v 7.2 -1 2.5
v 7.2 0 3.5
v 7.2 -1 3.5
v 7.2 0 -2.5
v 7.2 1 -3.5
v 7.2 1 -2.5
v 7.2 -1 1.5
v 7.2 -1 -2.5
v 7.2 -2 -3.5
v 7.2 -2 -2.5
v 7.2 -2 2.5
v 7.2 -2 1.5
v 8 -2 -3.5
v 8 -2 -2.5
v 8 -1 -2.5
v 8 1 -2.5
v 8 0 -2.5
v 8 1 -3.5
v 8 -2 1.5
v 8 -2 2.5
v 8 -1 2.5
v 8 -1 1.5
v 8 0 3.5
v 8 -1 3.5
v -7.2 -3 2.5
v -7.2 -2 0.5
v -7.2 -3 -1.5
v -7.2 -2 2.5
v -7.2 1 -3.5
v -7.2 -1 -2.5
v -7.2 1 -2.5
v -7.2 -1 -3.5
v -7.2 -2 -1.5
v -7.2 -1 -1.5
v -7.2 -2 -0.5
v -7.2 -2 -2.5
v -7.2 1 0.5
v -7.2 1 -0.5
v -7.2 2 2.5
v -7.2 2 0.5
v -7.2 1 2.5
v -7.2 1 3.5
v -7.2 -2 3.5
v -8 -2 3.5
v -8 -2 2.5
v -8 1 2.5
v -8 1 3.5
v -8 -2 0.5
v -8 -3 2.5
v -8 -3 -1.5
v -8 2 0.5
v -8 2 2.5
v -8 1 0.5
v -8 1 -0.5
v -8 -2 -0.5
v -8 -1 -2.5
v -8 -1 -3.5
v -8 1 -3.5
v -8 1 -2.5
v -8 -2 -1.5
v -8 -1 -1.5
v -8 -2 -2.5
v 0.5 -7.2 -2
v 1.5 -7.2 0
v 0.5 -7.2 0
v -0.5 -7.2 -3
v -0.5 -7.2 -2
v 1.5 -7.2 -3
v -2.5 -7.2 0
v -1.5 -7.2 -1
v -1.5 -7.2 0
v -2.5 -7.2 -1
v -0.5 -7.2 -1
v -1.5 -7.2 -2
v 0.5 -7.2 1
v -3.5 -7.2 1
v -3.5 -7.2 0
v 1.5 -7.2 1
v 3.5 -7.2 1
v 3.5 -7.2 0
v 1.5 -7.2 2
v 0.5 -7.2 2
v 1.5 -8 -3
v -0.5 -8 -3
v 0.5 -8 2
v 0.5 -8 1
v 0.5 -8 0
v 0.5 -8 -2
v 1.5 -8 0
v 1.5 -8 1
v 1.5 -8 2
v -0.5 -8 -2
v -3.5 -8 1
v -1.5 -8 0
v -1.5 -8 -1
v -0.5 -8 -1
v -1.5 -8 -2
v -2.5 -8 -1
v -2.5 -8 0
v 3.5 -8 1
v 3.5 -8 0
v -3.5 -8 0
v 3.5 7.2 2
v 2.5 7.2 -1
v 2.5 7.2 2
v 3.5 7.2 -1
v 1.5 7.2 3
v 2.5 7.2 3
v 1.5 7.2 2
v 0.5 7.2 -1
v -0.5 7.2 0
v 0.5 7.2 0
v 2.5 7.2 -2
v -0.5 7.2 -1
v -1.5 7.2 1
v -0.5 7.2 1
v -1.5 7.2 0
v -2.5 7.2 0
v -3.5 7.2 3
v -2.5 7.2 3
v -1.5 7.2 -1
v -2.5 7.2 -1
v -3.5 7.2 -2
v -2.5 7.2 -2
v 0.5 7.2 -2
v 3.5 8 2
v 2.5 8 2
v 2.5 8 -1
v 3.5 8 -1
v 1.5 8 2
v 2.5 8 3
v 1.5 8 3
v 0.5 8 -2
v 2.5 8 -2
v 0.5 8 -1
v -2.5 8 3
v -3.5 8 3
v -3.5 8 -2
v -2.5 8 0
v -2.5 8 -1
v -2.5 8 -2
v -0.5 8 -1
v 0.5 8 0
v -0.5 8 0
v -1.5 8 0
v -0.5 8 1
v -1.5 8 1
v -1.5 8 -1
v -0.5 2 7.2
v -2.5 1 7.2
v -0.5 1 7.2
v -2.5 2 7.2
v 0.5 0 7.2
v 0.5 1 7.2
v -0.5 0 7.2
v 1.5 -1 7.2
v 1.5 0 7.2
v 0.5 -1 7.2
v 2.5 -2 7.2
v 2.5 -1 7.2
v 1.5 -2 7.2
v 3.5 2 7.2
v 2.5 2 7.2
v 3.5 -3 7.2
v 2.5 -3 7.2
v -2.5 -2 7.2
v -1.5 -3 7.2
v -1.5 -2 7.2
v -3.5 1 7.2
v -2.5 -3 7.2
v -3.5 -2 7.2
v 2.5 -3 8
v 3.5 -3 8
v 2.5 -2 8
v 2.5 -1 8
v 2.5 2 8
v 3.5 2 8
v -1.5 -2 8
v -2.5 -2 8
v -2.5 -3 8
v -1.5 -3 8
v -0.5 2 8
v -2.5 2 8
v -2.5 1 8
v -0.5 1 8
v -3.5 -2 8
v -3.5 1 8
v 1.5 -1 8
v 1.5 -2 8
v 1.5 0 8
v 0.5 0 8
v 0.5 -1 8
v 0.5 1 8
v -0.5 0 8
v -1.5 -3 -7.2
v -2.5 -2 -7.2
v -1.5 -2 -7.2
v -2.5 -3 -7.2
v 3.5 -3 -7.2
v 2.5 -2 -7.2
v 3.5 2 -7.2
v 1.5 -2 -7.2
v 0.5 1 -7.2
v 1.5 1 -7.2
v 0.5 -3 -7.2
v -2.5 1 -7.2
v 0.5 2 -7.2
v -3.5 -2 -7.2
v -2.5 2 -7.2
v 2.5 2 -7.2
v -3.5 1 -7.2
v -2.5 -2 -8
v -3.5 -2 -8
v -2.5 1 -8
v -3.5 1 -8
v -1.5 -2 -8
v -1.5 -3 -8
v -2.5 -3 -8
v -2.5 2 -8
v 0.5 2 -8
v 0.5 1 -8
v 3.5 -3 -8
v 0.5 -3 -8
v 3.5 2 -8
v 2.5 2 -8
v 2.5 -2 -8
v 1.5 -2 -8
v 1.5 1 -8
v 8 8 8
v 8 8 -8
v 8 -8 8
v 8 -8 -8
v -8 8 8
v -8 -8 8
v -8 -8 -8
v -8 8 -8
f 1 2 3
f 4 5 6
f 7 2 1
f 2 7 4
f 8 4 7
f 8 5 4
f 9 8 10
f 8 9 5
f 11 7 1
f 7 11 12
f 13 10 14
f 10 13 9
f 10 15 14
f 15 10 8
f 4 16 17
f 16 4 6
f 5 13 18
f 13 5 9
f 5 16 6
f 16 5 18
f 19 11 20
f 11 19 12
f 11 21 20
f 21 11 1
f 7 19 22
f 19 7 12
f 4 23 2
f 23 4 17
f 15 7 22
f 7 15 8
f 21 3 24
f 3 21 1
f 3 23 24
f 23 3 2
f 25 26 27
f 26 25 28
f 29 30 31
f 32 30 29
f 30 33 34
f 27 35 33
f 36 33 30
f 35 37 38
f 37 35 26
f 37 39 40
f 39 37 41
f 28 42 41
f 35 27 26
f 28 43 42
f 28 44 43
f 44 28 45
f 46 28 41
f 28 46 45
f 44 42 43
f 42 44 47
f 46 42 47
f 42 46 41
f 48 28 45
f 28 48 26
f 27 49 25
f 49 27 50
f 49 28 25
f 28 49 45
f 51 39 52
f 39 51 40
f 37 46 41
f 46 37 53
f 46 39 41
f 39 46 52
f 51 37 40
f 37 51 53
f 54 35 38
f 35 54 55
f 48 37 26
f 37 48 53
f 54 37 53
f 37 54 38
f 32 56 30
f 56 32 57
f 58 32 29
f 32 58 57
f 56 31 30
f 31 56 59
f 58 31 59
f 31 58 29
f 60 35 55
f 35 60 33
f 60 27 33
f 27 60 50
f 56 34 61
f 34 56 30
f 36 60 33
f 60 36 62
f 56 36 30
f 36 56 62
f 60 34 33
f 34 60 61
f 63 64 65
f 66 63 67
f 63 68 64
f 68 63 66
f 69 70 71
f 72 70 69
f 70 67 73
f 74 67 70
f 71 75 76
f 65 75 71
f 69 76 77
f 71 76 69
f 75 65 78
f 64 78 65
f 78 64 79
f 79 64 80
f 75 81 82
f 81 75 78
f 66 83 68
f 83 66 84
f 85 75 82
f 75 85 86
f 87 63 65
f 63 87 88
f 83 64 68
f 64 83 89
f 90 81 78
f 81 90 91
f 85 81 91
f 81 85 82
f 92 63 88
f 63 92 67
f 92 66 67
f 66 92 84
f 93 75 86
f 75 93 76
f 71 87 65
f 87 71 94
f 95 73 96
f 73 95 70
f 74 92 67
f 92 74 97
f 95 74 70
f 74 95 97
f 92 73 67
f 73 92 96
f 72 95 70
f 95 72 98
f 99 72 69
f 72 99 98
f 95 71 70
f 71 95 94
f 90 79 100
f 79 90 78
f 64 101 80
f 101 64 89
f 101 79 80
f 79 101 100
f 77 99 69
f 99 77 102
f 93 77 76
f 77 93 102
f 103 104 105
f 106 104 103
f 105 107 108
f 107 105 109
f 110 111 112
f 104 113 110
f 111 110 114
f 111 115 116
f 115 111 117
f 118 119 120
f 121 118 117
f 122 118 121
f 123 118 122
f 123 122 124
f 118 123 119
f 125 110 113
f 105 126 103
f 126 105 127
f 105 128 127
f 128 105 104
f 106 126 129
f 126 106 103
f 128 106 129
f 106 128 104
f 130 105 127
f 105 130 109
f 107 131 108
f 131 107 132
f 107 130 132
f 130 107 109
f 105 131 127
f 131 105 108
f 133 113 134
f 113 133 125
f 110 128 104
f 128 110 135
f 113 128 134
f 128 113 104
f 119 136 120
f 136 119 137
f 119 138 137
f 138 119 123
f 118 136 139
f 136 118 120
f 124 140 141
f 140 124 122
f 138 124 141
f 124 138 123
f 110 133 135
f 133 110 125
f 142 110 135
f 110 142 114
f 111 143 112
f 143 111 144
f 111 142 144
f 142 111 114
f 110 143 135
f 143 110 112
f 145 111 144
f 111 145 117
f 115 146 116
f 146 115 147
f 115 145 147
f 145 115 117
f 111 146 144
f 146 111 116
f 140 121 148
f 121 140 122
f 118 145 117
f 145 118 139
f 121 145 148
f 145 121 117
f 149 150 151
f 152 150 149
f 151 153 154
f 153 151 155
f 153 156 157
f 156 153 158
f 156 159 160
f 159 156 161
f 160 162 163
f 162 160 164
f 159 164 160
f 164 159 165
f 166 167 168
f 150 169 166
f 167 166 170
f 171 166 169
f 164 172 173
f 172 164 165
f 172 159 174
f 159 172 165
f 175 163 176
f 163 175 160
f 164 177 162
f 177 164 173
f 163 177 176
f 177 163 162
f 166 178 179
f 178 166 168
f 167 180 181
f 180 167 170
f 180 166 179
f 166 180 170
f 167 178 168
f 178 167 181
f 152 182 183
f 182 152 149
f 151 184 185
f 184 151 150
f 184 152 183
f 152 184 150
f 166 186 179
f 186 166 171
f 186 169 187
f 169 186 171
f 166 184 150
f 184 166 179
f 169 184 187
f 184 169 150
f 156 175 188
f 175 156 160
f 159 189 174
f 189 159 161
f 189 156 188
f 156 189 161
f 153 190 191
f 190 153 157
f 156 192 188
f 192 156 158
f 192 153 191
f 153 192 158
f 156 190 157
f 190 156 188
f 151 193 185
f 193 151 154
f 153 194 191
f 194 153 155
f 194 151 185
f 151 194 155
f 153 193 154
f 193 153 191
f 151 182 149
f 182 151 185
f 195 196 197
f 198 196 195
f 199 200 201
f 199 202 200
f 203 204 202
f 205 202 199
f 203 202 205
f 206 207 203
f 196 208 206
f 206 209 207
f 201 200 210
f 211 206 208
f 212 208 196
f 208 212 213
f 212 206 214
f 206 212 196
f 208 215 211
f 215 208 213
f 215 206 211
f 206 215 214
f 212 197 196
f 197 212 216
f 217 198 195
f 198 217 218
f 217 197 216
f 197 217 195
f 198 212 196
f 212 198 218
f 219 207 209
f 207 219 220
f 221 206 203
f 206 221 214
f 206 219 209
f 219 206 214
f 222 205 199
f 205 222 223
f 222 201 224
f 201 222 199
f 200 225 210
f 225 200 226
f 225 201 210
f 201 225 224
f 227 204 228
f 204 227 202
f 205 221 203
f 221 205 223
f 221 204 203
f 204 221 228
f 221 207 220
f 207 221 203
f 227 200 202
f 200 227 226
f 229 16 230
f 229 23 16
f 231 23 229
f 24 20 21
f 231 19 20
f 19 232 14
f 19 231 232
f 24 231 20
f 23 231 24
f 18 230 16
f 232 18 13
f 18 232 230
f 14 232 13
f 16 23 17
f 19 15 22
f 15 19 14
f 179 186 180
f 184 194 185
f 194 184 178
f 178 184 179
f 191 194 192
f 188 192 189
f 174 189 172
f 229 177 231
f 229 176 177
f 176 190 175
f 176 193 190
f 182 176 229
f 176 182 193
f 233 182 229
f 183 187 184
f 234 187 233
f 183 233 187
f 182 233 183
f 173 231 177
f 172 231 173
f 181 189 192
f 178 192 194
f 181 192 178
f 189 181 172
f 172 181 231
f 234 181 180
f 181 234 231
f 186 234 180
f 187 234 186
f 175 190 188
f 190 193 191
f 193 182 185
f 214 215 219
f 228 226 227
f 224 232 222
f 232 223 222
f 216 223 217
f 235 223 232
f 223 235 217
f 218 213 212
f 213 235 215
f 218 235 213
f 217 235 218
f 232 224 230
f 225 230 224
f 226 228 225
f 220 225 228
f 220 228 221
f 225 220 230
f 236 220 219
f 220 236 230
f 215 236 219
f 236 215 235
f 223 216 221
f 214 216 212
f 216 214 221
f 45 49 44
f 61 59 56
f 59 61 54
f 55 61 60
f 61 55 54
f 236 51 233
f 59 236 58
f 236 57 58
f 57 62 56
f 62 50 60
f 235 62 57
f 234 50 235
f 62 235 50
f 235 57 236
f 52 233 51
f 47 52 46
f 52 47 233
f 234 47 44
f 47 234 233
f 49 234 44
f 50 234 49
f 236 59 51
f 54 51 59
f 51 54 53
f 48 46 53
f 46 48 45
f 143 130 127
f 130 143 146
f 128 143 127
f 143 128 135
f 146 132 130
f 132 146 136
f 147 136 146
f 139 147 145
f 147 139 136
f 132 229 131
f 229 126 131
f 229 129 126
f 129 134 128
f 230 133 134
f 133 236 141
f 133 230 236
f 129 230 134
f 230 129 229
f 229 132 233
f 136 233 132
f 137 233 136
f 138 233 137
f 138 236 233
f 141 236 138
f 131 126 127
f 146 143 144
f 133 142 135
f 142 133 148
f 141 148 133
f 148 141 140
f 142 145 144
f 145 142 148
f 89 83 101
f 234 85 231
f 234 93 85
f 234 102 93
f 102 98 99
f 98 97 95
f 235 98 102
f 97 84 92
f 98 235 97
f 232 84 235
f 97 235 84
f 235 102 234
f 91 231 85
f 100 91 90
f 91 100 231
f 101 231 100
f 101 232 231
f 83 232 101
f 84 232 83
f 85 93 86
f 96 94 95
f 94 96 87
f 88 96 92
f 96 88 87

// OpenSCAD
// file: TextGenerator.scad
//Draw text
scale([4,4,4]) drawtext("Hello World!");

//Draw character set
//scale([2,2,2]) drawtext(" !\"#$%&'()*+,-./0123456789:;<=>?@ABCDEFGHIJKLMNOPQRSTUVWXYZ[\\]^_`abcdefghijklmnopqrstuvwxyz{|}");

module drawtext(text,center=false) {
	//Characters
	chars = " !\"#$%&'()*+,-./0123456789:;<=>?@ABCDEFGHIJKLMNOPQRSTUVWXYZ[\\]^_`abcdefghijklmnopqrstuvwxyz{|}";

	//Chracter table defining 5x7 characters
	//Adapted from: http://www.geocities.com/dinceraydin/djlcdsim/chartable.js
	char_table = [ [ 0, 0, 0, 0, 0, 0, 0],
                  [ 4, 0, 4, 4, 4, 4, 4],
                  [ 0, 0, 0, 0,10,10,10],
                  [10,10,31,10,31,10,10],
                  [ 4,30, 5,14,20,15, 4],
                  [ 3,19, 8, 4, 2,25,24],
                  [13,18,21, 8,20,18,12],
                  [ 0, 0, 0, 0, 8, 4,12],
                  [ 2, 4, 8, 8, 8, 4, 2],
                  [ 8, 4, 2, 2, 2, 4, 8],
                  [ 0, 4,21,14,21, 4, 0],
                  [ 0, 4, 4,31, 4, 4, 0],
                  [ 8, 4,12, 0, 0, 0, 0],
                  [ 0, 0, 0,31, 0, 0, 0],
                  [12,12, 0, 0, 0, 0, 0],
                  [ 0,16, 8, 4, 2, 1, 0],
                  [14,17,25,21,19,17,14],
                  [14, 4, 4, 4, 4,12, 4],
                  [31, 8, 4, 2, 1,17,14],
                  [14,17, 1, 2, 4, 2,31],
                  [ 2, 2,31,18,10, 6, 2],
                  [14,17, 1, 1,30,16,31],
                  [14,17,17,30,16, 8, 6],
                  [ 8, 8, 8, 4, 2, 1,31],
                  [14,17,17,14,17,17,14],
                  [12, 2, 1,15,17,17,14],
                  [ 0,12,12, 0,12,12, 0],
                  [ 8, 4,12, 0,12,12, 0],
                  [ 2, 4, 8,16, 8, 4, 2],
                  [ 0, 0,31, 0,31, 0, 0],
                  [16, 8, 4, 2, 4, 8,16],
                  [ 4, 0, 4, 2, 1,17,14],
                  [14,21,21,13, 1,17,14],
                  [17,17,31,17,17,17,14],
                  [30,17,17,30,17,17,30],
                  [14,17,16,16,16,17,14],
                  [30,17,17,17,17,17,30],
                  [31,16,16,30,16,16,31],
                  [16,16,16,30,16,16,31],
                  [15,17,17,23,16,17,14],
                  [17,17,17,31,17,17,17],
                  [14, 4, 4, 4, 4, 4,14],
                  [12,18, 2, 2, 2, 2, 7],
                  [17,18,20,24,20,18,17],
                  [31,16,16,16,16,16,16],
                  [17,17,17,21,21,27,17],
                  [17,17,19,21,25,17,17],
                  [14,17,17,17,17,17,14],
                  [16,16,16,30,17,17,30],
                  [13,18,21,17,17,17,14],
                  [17,18,20,30,17,17,30],
                  [30, 1, 1,14,16,16,15],
                  [ 4, 4, 4, 4, 4, 4,31],
                  [14,17,17,17,17,17,17],
                  [ 4,10,17,17,17,17,17],
                  [10,21,21,21,17,17,17],
                  [17,17,10, 4,10,17,17],
                  [ 4, 4, 4,10,17,17,17],
                  [31,16, 8, 4, 2, 1,31],
                  [14, 8, 8, 8, 8, 8,14],
                  [ 0, 1, 2, 4, 8,16, 0],
                  [14, 2, 2, 2, 2, 2,14],
                  [ 0, 0, 0, 0,17,10, 4],
                  [31, 0, 0, 0, 0, 0, 0],
                  [ 0, 0, 0, 0, 2, 4, 8],
                  [15,17,15, 1,14, 0, 0],
                  [30,17,17,25,22,16,16],
                  [14,17,16,16,14, 0, 0],
                  [15,17,17,19,13, 1, 1],
                  [14,16,31,17,14, 0, 0],
                  [ 8, 8, 8,28, 8, 9, 6],
                  [14, 1,15,17,15, 0, 0],
                  [17,17,17,25,22,16,16],
                  [14, 4, 4, 4,12, 0, 4],
                  [12,18, 2, 2, 2, 6, 2],
                  [18,20,24,20,18,16,16],
                  [14, 4, 4, 4, 4, 4,12],
                  [17,17,21,21,26, 0, 0],
                  [17,17,17,25,22, 0, 0],
                  [14,17,17,17,14, 0, 0],
                  [16,16,30,17,30, 0, 0],
                  [ 1, 1,15,19,13, 0, 0],
                  [16,16,16,25,22, 0, 0],
                  [30, 1,14,16,15, 0, 0],
                  [ 6, 9, 8, 8,28, 8, 8],
                  [13,19,17,17,17, 0, 0],
                  [ 4,10,17,17,17, 0, 0],
                  [10,21,21,17,17, 0, 0],
                  [17,10, 4,10,17, 0, 0],
                  [14, 1,15,17,17, 0, 0],
                  [31, 8, 4, 2,31, 0, 0],
                  [ 2, 4, 4, 8, 4, 4, 2],
                  [ 4, 4, 4, 4, 4, 4, 4],
                  [ 8, 4, 4, 2, 4, 4, 8] ];

	//Binary decode table
	dec_table = [ "00000", "00001", "00010", "00011", "00100", "00101",
  	            "00110", "00111", "01000", "01001", "01010", "01011",
  	            "01100", "01101", "01110", "01111", "10000", "10001",
  	            "10010", "10011", "10100", "10101", "10110", "10111",
	            "11000", "11001", "11010", "11011", "11100", "11101",
	            "11110", "11111" ];

    //Process string one character at a time
    for(itext = [0:len(text)-1]) {
        assign(length = len(text)) {
            //Convert character to index
            assign(ichar = search(text[itext],chars,1)[0]) {
                //Decode character - rows
                for(irow = [0:6]) {
                    assign(val = dec_table[char_table[ichar][irow]]) {
                        //Decode character - cols
                        for(icol = [0:4]) {
                            assign(bit = search(val[icol],"01",1)[0]) {
                                if(bit) {
                                    //Output cube
                                    if (center)
                                        translate([icol - 2.5 +
                                        (6*itext)-len(text)/2, irow-3.5,0])
                                            cube([1.0001,1.0001,1]);
                                    else {
                                        translate([icol + (6*itext), irow, 0])
                                            cube([1.0001,1.0001,1]);
                                    }
                                }
                            }
                        }
                    }
                }
            }
	}
}
}
// main file
use <TextGenerator.scad>

D6_SIDE = 16;
delta = .8;

//D6
difference() {
  cube([D6_SIDE, D6_SIDE, D6_SIDE], center=true);

    union() {
        translate([D6_SIDE/2-delta, 0, 0]) {
            rotate([90,0,90]) {drawtext("1",center=true); }
        }
        translate([-D6_SIDE/2+delta, 0, 0]) {rotate([90,180,270]) {drawtext("6",center=true); }}
        translate([0,-D6_SIDE/2+delta, 0]) {rotate([270,-90,180]) {drawtext("4",center=true); }}
        translate([0,+D6_SIDE/2-delta, 0]) {rotate([90,90,180]) {drawtext("3",center=true); }}
        translate([0,0,+D6_SIDE/2-delta]) {rotate([0,0,90]) {drawtext("2",center=true); }}
        translate([0,0,-D6_SIDE/2+delta]) {rotate([180,0,90]) {drawtext("5",center=true); }}
    }
}
